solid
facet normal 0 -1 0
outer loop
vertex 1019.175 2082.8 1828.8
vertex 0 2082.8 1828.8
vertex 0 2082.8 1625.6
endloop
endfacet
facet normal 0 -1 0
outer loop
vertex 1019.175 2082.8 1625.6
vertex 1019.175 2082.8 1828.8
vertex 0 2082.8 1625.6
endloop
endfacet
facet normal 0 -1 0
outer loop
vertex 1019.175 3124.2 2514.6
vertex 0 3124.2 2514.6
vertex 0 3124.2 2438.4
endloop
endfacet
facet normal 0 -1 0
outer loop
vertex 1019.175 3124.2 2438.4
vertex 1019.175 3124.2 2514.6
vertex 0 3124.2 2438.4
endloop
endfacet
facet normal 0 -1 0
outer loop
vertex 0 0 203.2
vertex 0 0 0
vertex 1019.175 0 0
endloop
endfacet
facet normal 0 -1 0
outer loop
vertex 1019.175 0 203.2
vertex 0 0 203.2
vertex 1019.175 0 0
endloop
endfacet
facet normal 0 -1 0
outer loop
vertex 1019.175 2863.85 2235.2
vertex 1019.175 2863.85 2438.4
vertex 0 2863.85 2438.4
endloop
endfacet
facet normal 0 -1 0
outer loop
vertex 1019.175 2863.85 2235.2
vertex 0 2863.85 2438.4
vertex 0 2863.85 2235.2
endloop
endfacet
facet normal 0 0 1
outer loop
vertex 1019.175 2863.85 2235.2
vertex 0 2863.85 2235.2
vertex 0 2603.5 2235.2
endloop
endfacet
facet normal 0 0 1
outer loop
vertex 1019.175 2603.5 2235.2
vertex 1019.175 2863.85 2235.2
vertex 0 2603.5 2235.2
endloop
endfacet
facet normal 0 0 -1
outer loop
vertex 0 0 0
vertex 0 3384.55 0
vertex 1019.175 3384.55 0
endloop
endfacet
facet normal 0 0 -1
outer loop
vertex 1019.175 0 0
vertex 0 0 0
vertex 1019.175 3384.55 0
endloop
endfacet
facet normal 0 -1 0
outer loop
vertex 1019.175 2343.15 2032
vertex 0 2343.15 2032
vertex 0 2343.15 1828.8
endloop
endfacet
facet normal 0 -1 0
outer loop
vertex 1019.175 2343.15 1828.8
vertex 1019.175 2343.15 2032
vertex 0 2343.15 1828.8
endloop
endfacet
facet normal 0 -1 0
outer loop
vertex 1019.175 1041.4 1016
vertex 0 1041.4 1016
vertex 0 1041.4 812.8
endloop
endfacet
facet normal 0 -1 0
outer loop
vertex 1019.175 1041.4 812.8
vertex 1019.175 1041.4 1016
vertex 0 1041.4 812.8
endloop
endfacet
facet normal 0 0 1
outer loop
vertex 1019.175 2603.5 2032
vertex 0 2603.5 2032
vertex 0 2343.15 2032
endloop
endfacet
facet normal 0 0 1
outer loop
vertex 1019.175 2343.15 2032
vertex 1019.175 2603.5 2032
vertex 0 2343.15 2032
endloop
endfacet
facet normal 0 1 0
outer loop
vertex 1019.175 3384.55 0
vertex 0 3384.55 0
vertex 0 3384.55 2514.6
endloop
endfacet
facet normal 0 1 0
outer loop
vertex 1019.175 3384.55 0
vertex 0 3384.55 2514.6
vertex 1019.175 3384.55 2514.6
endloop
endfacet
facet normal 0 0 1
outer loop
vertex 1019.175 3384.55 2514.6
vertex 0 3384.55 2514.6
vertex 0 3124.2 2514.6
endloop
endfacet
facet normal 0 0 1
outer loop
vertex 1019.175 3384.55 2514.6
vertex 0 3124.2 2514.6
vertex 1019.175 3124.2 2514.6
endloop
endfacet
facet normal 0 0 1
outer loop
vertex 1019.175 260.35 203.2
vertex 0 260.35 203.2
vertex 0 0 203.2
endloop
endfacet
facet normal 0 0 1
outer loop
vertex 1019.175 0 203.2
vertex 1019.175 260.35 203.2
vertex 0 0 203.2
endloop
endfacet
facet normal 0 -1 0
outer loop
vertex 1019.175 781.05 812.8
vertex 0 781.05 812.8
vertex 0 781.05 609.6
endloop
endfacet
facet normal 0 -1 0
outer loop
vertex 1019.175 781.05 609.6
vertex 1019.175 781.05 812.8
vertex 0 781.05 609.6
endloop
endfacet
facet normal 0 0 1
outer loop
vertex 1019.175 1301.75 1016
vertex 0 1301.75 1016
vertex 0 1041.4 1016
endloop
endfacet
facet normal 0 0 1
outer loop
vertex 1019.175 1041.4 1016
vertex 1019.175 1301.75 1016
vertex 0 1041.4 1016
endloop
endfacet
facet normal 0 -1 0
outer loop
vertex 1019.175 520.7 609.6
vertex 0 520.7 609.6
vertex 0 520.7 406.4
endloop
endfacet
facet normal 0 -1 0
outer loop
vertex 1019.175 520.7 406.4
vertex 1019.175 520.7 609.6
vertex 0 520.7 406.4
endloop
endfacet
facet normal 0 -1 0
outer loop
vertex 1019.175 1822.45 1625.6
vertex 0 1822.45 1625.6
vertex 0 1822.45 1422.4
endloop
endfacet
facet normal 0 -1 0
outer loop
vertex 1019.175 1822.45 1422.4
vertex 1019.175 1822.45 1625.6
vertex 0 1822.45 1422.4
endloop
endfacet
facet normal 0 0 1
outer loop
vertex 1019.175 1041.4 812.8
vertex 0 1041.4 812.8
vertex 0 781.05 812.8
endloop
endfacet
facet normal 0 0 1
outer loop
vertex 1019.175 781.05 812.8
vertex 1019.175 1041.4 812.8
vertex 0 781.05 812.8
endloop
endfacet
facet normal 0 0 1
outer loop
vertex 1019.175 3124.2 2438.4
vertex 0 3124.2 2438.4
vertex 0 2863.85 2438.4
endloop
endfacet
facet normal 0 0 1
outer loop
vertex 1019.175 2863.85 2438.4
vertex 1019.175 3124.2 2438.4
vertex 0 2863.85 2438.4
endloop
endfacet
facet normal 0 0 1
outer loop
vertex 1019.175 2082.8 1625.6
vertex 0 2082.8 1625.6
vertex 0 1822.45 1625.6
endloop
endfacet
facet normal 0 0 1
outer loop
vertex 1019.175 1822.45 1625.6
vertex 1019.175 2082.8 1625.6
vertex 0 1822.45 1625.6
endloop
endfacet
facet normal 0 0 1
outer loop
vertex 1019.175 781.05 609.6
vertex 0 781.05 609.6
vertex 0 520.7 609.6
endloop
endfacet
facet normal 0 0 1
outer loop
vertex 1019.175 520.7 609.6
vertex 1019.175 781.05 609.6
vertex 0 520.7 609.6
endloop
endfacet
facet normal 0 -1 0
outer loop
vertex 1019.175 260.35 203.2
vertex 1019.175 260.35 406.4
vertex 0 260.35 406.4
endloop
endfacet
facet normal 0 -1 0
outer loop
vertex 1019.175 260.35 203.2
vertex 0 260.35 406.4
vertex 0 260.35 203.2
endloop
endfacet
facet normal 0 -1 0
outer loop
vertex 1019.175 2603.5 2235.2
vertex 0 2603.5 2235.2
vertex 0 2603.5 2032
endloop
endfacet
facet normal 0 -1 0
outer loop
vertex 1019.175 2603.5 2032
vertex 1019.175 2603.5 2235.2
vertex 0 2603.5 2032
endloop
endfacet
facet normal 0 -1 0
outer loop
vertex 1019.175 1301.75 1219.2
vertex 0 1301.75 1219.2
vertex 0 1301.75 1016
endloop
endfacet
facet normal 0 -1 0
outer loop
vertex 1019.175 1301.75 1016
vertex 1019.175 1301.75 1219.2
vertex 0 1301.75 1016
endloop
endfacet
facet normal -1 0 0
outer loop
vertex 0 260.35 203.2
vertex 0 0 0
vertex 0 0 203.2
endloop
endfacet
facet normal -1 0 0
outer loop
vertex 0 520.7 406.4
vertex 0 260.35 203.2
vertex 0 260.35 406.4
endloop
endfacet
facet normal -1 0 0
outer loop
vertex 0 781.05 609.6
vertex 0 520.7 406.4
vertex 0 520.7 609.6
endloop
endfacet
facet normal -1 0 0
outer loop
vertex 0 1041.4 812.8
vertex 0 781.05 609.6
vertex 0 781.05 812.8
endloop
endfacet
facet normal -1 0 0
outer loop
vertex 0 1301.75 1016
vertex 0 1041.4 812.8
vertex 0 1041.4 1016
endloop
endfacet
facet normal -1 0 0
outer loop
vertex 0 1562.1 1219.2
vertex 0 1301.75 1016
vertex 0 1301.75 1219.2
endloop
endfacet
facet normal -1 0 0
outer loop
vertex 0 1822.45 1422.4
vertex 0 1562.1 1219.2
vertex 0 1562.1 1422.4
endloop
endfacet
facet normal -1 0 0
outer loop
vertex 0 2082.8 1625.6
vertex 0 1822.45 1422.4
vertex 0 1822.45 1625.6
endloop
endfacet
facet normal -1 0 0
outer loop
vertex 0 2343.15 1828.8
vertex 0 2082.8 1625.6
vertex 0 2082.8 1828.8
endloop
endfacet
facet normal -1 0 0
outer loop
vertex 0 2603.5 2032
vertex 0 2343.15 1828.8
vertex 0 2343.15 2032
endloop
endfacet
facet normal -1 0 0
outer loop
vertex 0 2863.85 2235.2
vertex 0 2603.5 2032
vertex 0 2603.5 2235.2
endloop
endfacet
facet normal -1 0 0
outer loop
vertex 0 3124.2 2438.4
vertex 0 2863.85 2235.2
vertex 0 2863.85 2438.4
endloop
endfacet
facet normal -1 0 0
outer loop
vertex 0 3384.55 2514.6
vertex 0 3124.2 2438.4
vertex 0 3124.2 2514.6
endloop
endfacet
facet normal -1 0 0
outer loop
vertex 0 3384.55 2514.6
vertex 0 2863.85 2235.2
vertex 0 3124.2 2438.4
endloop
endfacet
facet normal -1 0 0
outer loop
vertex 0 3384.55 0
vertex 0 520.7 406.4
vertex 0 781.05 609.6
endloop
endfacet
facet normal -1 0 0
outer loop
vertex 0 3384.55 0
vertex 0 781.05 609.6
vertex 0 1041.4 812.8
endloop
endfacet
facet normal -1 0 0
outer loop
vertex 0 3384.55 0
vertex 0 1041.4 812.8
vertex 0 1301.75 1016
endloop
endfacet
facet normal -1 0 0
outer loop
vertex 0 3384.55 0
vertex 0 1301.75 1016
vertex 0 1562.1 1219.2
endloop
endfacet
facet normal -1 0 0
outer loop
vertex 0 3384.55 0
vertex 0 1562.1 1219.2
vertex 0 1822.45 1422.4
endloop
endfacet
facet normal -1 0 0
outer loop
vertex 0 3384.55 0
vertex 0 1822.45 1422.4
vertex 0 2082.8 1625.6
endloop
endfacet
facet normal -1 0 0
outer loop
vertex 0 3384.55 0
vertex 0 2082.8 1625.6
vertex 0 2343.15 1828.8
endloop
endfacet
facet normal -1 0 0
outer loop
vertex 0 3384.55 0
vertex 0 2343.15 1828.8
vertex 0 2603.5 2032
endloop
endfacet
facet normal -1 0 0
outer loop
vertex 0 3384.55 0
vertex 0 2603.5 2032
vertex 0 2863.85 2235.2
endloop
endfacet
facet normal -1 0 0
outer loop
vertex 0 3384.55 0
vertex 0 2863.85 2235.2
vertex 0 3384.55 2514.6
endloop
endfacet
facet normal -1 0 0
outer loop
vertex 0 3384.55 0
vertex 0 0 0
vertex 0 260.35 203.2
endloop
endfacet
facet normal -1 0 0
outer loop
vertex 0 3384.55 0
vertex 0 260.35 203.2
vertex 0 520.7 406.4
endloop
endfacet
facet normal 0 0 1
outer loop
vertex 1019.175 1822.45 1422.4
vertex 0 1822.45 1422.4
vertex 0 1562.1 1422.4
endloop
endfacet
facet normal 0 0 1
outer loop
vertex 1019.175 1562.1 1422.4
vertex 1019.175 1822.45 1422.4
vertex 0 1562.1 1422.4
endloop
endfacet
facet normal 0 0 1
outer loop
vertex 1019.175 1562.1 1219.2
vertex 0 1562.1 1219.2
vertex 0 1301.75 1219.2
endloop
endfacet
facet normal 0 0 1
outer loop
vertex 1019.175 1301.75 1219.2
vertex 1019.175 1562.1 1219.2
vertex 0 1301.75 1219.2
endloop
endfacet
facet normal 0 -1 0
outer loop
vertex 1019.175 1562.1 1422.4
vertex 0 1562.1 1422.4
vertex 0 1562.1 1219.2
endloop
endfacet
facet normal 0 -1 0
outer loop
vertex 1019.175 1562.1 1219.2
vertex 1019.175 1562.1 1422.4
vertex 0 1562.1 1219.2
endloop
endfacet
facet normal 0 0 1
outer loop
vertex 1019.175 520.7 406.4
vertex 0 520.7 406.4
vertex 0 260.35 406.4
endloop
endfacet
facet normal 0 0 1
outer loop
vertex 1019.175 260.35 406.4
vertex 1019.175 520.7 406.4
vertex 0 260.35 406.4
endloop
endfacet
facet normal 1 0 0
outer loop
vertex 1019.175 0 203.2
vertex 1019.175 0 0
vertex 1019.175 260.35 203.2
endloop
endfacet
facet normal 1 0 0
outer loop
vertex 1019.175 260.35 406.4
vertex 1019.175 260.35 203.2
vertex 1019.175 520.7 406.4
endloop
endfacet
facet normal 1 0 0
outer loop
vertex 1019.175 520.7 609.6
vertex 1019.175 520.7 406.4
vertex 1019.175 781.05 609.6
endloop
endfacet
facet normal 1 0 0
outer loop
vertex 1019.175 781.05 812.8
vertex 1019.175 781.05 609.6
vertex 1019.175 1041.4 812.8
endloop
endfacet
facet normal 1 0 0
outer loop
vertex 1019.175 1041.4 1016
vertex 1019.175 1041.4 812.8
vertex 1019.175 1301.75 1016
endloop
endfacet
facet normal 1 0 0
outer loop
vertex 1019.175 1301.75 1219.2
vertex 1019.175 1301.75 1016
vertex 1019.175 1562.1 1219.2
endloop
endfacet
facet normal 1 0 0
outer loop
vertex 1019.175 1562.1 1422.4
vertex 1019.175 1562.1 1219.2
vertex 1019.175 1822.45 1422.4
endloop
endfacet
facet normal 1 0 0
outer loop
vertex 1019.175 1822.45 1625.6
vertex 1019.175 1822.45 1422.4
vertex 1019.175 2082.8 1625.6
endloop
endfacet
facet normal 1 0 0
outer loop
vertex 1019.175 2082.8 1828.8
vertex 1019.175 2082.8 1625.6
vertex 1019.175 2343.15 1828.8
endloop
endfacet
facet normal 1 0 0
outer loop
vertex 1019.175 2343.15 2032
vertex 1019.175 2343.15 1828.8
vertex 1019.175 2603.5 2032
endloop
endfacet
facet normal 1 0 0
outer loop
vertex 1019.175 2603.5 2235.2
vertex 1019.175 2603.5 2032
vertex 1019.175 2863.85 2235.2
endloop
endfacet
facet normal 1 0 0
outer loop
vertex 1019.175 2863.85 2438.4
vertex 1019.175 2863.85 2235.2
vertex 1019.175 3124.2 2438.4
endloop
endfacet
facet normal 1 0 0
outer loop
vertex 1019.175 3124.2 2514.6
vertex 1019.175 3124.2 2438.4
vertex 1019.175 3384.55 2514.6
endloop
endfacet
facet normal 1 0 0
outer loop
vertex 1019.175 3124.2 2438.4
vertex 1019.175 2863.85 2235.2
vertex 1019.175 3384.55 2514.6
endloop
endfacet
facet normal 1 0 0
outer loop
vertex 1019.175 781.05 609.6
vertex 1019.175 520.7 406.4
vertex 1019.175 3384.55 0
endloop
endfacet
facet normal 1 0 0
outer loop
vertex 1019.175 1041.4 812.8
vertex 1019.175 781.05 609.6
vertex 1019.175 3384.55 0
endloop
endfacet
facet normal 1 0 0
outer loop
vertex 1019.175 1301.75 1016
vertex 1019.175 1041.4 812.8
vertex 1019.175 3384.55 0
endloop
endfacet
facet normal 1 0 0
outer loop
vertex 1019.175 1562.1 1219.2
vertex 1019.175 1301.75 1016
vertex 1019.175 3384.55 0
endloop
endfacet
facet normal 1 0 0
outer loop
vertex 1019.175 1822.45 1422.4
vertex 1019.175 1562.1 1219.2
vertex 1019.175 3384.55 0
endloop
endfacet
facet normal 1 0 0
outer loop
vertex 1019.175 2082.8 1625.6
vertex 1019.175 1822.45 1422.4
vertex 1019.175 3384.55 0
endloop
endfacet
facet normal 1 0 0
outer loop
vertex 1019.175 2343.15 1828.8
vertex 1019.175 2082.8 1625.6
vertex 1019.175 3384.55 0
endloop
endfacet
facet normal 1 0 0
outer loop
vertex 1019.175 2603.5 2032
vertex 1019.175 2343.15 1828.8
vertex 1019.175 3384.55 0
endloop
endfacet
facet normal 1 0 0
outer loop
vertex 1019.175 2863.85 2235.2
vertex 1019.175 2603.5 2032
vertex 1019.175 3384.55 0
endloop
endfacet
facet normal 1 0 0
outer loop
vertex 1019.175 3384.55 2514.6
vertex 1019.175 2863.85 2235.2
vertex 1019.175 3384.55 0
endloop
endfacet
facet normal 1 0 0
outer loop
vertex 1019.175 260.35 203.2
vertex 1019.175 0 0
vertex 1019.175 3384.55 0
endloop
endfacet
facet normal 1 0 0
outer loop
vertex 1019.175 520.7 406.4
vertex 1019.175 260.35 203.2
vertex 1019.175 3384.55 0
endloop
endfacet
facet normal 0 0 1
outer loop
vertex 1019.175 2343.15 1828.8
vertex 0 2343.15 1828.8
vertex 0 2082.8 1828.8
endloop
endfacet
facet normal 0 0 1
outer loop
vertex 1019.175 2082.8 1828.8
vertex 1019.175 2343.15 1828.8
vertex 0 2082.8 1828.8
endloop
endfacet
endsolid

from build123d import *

# Parameters (mm, degrees)
F0_W     = 1019.175
F0_H     = 3384.55
F1_DEPTH = 2514.6
F3_DEPTH = 1019.175


with BuildPart() as f1:
    # F0 (on Top) → F1 (new body)
    with BuildSketch(Plane.XY):
        with Locations((509.5875, 1692.275)):
            Rectangle(F0_W, F0_H)
    extrude(amount=F1_DEPTH)

    # F2 (on face) → F3 (cut)
    with BuildSketch(Plane(origin=(0, 0, 0), x_dir=(0, -1, 0), z_dir=(-1, 0, 0))):
        Polygon((-260.35, 203.2), (0, 203.2), (0, 2514.6), (-3124.2, 2514.6), (-3124.2, 2438.4), (-2863.85, 2438.4), (-2863.85, 2235.2), (-2603.5, 2235.2), (-2603.5, 2032), (-2343.15, 2032), (-2343.15, 1828.8), (-2082.8, 1828.8), (-2082.8, 1625.6), (-1822.45, 1625.6), (-1822.45, 1422.4), (-1562.1, 1422.4), (-1562.1, 1219.2), (-1301.75, 1219.2), (-1301.75, 1016), (-1041.4, 1016), (-1041.4, 812.8), (-781.05, 812.8), (-781.05, 609.6), (-520.7, 609.6), (-520.7, 406.4), (-260.35, 406.4), align=None)
    extrude(amount=-F3_DEPTH, mode=Mode.SUBTRACT)


solid = f1.part
